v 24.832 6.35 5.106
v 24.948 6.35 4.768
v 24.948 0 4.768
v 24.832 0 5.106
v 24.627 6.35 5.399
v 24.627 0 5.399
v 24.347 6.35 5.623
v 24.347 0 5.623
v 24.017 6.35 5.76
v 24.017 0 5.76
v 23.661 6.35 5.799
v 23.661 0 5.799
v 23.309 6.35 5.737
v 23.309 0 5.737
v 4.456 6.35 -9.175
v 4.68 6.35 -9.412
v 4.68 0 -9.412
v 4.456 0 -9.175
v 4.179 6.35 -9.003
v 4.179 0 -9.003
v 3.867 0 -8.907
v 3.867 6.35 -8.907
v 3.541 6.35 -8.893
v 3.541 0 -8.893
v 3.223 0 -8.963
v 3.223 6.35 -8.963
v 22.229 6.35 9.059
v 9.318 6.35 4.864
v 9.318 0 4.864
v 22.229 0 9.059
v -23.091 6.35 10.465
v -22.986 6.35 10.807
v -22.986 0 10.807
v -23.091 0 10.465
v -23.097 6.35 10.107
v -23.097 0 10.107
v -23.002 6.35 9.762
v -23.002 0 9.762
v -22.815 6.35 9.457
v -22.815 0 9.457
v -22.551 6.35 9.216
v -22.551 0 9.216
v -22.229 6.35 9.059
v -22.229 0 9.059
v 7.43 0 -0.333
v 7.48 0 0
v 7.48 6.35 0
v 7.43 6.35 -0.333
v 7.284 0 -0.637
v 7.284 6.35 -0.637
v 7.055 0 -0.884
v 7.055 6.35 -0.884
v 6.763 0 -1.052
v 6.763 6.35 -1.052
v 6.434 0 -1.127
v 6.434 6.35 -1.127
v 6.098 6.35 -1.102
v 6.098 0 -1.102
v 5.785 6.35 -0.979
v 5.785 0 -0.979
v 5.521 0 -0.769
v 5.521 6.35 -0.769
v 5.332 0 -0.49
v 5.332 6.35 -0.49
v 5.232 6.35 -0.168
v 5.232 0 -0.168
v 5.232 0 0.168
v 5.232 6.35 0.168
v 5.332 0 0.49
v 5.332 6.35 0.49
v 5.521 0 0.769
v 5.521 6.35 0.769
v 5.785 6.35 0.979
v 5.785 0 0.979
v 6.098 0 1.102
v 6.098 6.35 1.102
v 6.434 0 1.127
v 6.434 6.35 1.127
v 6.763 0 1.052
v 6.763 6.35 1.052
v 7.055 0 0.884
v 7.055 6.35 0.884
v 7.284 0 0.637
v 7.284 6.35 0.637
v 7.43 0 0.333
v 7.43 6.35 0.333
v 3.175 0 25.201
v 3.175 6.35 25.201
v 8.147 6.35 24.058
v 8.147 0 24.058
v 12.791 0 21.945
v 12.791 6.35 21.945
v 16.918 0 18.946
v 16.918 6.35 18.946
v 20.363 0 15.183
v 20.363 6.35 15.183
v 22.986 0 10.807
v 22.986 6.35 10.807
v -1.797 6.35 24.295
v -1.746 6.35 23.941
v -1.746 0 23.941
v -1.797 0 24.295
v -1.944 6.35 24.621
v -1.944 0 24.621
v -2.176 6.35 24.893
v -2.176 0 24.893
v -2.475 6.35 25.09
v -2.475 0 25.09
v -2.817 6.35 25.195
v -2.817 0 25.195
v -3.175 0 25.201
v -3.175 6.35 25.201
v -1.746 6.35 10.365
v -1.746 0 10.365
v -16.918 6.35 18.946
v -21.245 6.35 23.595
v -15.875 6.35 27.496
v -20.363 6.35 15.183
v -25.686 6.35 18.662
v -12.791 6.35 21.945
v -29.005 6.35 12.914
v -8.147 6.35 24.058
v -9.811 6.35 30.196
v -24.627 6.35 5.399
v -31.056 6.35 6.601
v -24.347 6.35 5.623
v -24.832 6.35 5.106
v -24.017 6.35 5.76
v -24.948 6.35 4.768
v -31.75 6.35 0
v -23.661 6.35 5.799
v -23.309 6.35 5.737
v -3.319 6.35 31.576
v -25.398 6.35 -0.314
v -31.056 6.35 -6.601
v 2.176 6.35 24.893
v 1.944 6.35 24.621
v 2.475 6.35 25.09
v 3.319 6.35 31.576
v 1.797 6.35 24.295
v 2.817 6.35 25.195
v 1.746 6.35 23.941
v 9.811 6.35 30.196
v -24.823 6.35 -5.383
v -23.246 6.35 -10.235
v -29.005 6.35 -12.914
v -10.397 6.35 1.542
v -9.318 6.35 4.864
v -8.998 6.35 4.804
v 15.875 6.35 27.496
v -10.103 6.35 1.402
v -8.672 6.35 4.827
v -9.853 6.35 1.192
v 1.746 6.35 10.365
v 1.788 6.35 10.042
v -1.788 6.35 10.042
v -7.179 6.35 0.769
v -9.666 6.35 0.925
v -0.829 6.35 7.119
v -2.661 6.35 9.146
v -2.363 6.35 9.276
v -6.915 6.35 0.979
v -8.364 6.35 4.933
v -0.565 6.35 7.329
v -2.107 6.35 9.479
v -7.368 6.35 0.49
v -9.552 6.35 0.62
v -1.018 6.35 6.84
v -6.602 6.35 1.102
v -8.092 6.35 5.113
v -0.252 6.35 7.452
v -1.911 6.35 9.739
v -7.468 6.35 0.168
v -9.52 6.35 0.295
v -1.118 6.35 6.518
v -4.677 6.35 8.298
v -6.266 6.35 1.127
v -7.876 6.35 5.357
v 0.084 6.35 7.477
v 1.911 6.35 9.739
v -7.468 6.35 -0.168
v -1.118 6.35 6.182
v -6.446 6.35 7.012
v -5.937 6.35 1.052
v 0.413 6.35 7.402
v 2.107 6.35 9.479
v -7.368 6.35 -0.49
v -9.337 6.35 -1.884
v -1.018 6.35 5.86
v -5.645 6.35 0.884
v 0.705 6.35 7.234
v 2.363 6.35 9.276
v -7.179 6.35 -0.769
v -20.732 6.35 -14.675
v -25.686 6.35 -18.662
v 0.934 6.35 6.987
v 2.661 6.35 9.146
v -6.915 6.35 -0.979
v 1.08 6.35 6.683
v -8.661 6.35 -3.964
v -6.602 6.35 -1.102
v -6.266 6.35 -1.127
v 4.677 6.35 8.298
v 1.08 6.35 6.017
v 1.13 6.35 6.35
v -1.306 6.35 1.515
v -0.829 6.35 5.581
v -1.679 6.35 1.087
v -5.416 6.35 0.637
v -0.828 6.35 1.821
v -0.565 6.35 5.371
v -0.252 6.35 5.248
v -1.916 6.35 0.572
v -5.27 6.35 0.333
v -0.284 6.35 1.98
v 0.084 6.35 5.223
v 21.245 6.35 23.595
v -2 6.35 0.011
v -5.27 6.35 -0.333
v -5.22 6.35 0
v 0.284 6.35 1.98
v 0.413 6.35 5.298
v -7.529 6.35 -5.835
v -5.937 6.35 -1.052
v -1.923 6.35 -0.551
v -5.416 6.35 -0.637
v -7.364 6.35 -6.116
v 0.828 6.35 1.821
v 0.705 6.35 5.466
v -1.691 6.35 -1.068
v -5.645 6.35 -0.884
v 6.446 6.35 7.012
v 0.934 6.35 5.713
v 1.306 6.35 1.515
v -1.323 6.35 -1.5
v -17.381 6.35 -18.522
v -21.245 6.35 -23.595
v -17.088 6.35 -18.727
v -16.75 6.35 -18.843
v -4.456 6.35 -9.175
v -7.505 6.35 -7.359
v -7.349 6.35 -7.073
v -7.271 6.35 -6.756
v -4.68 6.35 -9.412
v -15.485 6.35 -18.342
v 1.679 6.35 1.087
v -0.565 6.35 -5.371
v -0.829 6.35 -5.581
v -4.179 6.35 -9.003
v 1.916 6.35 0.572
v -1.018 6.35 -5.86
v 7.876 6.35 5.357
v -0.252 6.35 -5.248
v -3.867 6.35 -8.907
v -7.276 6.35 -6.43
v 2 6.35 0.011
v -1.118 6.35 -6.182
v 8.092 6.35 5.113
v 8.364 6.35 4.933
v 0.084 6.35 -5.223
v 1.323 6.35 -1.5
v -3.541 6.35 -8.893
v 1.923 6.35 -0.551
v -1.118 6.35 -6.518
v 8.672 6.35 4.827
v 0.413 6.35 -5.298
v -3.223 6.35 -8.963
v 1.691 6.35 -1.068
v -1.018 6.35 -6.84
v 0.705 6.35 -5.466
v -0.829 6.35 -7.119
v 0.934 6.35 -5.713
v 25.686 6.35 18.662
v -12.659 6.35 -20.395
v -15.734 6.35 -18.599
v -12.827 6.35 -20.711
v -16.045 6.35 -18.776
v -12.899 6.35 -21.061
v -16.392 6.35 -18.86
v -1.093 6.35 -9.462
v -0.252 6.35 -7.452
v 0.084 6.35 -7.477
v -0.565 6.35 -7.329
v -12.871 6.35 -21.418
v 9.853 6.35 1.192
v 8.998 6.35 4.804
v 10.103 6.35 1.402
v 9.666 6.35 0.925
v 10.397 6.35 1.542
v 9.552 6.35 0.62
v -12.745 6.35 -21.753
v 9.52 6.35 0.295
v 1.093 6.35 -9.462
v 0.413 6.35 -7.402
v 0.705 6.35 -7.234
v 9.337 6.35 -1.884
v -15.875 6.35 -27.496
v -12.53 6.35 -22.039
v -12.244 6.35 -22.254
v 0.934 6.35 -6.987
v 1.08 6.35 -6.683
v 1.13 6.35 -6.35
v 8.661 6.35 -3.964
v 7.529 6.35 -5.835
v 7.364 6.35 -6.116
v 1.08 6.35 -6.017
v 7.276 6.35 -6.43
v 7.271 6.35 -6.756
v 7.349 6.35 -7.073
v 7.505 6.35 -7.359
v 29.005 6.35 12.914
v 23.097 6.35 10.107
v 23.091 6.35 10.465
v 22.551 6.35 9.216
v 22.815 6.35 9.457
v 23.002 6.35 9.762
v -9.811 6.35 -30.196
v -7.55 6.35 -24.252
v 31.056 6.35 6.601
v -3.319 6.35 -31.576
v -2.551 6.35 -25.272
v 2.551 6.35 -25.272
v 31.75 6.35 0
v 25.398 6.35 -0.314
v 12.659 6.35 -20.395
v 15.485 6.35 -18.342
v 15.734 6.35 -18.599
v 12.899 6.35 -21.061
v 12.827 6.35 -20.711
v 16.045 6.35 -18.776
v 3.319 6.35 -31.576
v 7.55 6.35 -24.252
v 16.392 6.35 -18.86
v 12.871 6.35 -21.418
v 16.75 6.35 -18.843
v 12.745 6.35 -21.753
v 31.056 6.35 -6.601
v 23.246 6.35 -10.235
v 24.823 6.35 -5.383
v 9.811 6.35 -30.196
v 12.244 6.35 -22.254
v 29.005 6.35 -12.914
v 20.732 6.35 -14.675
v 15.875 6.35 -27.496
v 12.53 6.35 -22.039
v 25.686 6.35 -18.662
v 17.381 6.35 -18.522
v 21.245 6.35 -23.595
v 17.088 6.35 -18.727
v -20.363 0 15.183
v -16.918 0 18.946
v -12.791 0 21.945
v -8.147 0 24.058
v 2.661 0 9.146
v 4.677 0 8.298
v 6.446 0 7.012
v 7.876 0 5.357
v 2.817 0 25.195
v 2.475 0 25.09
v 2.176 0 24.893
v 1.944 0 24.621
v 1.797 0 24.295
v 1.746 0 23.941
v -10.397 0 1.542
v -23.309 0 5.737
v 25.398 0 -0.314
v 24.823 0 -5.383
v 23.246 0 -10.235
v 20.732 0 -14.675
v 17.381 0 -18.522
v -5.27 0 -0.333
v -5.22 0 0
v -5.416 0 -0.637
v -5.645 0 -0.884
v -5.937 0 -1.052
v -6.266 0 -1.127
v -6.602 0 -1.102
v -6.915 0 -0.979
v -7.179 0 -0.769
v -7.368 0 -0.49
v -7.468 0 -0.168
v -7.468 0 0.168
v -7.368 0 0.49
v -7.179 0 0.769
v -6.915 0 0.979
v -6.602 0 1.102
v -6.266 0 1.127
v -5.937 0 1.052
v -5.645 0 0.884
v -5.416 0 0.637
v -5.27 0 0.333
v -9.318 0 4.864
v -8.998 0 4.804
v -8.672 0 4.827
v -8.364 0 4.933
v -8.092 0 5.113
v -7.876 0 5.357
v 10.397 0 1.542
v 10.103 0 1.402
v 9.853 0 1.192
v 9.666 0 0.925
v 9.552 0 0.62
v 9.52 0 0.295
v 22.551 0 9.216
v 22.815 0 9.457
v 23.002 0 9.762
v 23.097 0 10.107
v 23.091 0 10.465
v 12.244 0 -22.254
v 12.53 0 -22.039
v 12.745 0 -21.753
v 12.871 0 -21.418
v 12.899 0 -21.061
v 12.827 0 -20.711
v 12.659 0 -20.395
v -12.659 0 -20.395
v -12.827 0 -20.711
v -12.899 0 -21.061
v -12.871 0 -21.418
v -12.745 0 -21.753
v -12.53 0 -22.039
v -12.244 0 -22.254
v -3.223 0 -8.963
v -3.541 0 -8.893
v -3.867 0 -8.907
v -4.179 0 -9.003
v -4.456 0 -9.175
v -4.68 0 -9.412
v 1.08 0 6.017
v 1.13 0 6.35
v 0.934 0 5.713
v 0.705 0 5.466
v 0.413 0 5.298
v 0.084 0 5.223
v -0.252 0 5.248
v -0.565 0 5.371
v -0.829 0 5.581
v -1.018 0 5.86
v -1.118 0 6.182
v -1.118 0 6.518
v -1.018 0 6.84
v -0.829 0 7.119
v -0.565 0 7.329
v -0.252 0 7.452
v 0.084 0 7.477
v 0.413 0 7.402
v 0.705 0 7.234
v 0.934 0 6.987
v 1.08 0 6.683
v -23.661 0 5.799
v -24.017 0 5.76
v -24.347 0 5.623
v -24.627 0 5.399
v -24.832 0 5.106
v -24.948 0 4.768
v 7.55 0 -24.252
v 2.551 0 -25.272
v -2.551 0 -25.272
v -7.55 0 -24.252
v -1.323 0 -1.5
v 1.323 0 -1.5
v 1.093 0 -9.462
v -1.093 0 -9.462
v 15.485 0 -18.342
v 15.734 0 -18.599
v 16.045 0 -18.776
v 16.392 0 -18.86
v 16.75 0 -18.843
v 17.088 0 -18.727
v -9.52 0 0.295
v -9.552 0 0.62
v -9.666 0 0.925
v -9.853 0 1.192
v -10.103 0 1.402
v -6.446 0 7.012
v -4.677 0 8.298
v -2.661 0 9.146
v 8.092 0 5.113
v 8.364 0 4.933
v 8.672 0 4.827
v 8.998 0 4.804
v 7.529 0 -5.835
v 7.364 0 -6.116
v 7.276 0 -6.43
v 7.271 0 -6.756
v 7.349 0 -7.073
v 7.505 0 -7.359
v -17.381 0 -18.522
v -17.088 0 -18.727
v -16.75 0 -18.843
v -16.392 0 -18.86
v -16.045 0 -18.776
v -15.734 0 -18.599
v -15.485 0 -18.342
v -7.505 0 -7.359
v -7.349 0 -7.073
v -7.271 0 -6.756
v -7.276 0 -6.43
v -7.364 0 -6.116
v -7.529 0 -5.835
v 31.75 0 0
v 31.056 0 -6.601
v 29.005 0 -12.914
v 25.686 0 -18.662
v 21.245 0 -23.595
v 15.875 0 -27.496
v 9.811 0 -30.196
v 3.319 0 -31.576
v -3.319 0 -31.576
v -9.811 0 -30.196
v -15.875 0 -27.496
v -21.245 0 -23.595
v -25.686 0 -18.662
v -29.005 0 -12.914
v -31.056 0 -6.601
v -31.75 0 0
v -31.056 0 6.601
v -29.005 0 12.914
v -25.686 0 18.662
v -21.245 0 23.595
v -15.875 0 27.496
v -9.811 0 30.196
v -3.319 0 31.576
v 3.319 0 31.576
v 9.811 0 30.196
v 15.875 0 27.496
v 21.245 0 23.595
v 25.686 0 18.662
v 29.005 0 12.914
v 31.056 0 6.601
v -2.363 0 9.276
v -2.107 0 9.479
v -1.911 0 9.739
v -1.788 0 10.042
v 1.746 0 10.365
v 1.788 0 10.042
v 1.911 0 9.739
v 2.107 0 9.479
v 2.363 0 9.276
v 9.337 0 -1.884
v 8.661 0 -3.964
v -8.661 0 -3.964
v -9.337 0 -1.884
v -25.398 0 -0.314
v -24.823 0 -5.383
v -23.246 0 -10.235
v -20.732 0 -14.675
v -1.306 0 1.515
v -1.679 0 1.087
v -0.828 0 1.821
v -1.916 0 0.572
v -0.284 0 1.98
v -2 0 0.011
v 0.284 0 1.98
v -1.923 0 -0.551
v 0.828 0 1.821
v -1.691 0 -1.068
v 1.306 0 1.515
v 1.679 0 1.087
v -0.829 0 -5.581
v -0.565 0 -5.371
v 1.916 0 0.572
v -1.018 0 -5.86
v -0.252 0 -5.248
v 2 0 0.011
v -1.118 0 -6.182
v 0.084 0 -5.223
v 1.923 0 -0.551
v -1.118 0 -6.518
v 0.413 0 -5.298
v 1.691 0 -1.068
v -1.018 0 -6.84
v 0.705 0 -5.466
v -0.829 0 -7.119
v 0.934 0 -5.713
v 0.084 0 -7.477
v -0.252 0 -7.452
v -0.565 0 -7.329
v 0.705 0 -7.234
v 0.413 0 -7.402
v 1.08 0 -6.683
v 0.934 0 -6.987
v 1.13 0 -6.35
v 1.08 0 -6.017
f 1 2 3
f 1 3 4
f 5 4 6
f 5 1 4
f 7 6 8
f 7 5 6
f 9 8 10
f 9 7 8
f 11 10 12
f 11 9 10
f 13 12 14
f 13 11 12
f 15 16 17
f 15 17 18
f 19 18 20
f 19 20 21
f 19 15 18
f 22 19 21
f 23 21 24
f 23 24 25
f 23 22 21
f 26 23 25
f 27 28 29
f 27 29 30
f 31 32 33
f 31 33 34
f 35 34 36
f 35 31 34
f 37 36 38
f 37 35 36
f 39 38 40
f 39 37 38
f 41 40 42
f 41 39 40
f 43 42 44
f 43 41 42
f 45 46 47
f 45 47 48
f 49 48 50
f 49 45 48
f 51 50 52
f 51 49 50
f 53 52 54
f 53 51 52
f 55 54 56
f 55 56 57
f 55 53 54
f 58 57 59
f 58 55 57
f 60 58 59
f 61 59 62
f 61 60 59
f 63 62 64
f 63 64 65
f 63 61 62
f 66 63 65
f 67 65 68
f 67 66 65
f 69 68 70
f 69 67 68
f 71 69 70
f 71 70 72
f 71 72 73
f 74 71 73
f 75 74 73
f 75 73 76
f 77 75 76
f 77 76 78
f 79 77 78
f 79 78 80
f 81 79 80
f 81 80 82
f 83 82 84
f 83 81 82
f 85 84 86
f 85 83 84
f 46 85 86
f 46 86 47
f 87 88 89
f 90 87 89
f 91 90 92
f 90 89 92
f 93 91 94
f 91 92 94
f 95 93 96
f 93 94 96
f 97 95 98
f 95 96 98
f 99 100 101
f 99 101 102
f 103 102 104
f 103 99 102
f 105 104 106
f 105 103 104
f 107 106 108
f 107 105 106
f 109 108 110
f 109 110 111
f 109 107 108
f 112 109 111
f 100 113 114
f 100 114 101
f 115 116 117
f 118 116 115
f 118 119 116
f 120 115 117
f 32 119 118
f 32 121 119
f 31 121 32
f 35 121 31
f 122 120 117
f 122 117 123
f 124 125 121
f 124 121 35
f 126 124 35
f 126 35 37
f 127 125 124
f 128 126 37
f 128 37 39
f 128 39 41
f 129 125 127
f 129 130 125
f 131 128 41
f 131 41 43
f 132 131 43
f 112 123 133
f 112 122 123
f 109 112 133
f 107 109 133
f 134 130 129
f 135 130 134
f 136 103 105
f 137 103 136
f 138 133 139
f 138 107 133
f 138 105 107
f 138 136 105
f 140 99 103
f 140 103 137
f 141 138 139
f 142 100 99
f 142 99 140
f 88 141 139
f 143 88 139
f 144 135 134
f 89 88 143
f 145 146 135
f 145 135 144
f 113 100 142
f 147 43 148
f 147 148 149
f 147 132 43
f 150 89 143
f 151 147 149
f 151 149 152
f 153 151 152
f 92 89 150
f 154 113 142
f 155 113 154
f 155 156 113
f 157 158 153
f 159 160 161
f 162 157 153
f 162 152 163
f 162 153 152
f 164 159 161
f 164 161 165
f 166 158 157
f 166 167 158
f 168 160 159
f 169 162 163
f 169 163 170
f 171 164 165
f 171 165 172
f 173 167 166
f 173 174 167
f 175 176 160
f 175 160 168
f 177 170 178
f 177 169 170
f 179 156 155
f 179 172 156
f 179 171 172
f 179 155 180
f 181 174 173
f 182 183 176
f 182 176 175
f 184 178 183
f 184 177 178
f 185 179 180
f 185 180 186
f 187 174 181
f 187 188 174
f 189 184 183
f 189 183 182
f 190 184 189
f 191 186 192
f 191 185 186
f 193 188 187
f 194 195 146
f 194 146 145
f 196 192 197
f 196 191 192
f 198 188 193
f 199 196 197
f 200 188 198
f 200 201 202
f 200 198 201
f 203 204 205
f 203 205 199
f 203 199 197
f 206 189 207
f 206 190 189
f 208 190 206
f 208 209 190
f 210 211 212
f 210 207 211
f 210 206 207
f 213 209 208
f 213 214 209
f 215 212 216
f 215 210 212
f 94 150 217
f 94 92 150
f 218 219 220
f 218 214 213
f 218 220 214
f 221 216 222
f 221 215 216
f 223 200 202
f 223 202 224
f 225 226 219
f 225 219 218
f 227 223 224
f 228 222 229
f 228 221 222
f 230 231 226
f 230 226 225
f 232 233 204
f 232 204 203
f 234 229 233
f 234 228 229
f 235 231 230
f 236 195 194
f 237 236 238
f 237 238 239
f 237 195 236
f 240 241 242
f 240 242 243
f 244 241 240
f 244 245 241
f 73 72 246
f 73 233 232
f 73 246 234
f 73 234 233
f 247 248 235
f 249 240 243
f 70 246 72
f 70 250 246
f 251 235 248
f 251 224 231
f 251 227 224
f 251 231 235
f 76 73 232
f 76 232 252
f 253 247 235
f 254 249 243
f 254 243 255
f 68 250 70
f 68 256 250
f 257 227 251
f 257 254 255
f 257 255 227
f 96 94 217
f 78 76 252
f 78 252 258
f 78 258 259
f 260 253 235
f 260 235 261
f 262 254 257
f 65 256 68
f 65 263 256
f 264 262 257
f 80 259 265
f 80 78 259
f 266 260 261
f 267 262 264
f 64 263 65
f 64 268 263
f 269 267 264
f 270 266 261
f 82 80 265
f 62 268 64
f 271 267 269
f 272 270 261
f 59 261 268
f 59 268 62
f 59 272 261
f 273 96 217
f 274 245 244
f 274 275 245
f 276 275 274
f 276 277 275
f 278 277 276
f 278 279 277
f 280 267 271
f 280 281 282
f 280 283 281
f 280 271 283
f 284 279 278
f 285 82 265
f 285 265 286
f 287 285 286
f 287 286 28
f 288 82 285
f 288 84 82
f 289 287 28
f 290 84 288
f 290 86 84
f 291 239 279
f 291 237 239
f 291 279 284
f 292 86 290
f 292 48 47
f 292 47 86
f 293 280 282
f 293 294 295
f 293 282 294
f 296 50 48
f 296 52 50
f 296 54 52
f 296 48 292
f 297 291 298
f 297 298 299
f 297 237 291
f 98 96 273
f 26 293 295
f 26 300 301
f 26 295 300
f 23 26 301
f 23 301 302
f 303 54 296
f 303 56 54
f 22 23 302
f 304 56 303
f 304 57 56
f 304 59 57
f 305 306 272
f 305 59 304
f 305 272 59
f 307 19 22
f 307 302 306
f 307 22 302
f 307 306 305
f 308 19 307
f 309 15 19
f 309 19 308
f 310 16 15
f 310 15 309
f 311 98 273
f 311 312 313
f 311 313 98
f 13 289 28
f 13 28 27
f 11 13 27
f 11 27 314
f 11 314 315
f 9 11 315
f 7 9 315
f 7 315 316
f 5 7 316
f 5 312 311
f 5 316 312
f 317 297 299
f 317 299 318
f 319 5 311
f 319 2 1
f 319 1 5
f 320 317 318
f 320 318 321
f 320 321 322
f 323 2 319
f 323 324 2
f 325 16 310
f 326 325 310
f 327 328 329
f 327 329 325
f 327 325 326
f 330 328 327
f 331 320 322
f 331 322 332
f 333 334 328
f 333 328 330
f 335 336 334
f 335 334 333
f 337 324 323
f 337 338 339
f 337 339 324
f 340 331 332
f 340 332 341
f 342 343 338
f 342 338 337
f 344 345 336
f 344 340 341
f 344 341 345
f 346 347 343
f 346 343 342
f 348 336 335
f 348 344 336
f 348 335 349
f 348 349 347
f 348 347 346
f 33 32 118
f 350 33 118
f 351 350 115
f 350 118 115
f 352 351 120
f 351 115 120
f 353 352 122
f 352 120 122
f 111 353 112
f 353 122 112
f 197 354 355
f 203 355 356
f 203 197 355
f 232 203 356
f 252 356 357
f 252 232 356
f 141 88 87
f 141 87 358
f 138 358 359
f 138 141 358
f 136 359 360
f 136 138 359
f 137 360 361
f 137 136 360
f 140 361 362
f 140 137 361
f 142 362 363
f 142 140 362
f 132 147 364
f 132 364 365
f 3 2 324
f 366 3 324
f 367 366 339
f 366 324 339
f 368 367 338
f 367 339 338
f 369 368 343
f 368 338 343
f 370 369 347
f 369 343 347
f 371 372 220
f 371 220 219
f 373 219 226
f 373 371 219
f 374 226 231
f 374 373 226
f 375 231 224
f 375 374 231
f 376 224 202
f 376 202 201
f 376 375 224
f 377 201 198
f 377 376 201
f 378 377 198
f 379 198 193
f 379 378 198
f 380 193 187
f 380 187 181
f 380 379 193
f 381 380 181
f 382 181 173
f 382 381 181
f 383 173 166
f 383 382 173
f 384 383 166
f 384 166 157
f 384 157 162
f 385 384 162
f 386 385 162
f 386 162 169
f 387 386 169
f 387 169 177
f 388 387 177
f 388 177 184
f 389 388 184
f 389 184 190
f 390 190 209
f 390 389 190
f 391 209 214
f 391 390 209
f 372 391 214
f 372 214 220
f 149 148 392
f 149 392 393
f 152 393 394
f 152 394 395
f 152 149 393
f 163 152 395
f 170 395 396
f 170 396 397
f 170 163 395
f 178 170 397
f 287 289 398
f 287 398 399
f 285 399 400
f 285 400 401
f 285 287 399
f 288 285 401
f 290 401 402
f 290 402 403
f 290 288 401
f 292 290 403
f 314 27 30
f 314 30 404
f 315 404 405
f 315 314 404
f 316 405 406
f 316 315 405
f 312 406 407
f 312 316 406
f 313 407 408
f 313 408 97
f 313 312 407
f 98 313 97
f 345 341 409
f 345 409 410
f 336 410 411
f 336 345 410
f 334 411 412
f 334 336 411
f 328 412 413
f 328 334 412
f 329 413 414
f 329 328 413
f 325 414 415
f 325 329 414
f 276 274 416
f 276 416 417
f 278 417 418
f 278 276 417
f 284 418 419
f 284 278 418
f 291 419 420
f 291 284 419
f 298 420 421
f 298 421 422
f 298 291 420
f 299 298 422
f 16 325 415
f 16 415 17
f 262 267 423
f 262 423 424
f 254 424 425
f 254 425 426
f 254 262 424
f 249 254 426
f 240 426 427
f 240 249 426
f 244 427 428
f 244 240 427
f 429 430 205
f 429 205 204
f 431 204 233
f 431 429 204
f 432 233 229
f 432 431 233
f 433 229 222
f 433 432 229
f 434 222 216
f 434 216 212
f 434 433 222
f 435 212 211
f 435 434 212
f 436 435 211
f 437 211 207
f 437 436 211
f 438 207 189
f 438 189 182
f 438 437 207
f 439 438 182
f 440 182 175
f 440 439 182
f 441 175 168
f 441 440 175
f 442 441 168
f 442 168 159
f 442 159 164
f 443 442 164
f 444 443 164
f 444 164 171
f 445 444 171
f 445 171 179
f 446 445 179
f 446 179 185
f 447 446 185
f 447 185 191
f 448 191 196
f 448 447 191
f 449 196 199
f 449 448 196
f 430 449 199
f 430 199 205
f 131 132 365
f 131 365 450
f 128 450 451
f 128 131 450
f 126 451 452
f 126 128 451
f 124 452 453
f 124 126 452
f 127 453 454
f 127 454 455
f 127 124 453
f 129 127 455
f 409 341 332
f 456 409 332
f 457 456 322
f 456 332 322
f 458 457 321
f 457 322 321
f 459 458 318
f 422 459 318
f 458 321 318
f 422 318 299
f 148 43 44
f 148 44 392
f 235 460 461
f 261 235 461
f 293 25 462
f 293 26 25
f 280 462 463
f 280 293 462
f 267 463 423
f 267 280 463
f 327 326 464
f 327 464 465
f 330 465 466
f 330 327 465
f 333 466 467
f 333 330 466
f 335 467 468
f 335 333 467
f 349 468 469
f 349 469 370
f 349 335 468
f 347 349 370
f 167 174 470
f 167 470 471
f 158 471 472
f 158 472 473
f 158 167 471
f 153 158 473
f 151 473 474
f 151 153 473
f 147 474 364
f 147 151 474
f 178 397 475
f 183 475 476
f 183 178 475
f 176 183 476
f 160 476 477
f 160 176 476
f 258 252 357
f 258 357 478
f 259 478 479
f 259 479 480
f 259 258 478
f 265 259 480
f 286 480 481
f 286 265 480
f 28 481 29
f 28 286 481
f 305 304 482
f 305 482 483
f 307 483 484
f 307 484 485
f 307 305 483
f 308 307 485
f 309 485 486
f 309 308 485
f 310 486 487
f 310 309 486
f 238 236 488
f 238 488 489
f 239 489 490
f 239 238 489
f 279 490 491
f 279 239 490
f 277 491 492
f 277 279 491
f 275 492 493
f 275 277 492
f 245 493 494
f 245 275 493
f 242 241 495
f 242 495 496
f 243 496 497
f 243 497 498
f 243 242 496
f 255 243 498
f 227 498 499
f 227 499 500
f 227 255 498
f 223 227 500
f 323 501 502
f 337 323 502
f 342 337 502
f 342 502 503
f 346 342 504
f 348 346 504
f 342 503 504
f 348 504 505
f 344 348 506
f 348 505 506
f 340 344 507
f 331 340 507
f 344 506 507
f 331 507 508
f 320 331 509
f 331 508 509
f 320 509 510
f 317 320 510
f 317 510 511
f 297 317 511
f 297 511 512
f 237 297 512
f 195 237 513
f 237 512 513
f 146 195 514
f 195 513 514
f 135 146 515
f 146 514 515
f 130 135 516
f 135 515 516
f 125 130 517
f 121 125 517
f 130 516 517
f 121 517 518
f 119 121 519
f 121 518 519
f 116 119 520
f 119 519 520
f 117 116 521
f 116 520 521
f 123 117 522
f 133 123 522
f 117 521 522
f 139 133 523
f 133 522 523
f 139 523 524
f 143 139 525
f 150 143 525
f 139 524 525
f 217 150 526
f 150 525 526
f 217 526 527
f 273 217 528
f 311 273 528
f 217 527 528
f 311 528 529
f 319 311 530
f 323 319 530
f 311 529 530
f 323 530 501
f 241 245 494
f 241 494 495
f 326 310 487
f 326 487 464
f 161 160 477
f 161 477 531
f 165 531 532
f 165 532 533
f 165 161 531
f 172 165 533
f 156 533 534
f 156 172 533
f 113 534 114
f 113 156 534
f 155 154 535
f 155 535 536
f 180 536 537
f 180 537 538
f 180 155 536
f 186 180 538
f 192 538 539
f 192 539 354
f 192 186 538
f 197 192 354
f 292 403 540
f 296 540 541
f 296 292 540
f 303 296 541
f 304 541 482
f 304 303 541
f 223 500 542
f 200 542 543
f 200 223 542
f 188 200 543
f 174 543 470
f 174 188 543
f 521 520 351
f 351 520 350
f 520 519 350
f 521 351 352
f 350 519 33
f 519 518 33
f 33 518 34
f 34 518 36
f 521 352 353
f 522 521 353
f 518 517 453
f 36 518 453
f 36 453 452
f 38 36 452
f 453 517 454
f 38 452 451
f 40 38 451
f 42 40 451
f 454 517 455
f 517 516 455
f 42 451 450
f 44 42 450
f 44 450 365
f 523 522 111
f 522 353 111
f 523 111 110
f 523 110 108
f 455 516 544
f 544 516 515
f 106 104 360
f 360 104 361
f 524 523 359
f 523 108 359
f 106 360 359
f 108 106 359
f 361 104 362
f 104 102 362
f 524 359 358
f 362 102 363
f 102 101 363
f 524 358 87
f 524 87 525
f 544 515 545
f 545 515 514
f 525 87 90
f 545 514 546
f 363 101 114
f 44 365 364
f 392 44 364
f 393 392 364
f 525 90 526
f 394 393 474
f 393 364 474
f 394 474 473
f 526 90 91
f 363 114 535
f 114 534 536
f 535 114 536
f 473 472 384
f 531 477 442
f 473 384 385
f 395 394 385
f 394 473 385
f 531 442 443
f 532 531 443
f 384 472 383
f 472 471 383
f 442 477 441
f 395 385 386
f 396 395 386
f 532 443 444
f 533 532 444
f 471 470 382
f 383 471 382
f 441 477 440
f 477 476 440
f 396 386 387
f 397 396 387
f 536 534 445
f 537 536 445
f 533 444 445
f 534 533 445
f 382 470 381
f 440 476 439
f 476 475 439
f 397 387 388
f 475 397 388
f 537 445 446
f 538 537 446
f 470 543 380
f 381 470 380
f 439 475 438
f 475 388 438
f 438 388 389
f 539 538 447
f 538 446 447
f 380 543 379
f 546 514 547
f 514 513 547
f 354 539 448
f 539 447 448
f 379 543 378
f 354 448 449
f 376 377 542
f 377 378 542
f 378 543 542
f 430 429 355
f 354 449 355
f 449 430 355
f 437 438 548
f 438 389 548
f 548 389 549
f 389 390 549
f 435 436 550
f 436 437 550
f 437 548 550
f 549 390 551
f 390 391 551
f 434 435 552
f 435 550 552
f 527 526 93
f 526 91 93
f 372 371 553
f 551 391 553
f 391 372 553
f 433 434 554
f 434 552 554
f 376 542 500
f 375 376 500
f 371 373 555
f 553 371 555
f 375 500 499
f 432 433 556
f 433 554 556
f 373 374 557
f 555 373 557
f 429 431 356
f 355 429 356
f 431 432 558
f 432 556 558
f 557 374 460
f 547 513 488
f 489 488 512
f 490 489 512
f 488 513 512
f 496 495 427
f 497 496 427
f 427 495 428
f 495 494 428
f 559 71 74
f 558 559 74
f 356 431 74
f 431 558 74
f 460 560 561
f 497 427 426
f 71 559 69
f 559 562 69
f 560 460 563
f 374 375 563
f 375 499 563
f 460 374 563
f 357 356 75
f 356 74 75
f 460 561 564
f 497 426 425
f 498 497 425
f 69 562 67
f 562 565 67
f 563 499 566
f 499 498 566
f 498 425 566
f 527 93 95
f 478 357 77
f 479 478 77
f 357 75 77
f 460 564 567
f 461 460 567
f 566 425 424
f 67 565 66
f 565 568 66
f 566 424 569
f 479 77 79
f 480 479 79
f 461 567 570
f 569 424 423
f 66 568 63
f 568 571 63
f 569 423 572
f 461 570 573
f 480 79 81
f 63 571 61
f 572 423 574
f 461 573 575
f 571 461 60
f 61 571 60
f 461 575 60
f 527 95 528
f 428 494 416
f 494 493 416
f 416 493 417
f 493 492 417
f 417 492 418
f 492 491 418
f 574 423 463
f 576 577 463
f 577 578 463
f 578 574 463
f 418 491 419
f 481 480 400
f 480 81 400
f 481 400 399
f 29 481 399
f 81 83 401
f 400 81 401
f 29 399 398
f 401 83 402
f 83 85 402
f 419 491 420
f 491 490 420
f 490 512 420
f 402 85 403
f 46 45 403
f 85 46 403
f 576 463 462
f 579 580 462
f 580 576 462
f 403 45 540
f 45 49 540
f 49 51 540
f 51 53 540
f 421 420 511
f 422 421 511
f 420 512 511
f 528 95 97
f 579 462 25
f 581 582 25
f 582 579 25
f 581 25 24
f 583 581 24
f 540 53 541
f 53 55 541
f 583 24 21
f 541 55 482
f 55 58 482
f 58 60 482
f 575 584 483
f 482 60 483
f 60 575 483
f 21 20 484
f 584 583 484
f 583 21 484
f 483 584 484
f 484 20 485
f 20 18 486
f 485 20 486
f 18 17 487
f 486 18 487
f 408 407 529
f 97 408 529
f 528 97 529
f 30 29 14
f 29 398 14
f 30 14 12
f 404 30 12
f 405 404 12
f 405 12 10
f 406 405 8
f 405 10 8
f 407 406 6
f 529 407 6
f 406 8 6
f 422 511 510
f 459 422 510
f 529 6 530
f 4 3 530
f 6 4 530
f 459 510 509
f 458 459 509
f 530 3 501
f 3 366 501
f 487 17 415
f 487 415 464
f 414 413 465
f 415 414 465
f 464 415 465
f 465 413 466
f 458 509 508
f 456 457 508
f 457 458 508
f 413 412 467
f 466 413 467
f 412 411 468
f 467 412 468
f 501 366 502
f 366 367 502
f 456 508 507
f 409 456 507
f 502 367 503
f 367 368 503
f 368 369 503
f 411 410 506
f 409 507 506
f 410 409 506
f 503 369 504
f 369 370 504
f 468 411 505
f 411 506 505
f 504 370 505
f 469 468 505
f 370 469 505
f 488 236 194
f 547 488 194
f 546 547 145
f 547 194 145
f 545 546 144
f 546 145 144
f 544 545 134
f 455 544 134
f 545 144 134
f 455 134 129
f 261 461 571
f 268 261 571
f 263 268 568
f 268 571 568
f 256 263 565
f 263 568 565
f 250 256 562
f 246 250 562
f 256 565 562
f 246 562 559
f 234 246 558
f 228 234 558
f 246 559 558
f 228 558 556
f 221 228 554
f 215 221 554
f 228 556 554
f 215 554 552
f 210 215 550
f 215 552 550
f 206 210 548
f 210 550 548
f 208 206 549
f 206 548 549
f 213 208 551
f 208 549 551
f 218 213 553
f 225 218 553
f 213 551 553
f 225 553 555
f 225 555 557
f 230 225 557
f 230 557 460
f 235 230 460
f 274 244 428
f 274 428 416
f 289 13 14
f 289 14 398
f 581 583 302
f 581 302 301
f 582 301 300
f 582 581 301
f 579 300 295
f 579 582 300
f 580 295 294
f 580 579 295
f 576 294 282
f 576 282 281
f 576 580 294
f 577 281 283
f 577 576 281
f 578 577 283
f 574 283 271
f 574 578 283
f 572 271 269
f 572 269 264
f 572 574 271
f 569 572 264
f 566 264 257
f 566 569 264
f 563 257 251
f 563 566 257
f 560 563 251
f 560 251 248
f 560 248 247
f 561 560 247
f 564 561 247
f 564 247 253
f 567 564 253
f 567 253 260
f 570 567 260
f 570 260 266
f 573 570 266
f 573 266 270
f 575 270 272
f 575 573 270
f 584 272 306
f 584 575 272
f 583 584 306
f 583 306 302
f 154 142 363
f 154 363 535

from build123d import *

# Parameters (mm, degrees)
SKETCH1_R           = 31.75
SKETCH1_R_2         = 1.1303
BOSS_EXTRUDE1_DEPTH = 6.35
SKETCH2_R           = 25.4
SKETCH2_R_2         = 9.525
CUT_EXTRUDE1_DEPTH  = 6.35
BOSS_EXTRUDE2_DEPTH = 6.35
CIRPATTERN1_COUNT   = 5


with BuildPart() as part:
    # Sketch1 → Boss-Extrude1 (new body)
    with BuildSketch(Plane(origin=(0, 0, 0), x_dir=(1, 0, 0), z_dir=(0, 1, 0))):
        Circle(SKETCH1_R)
        with Locations((-6.35, 0)):
            Circle(SKETCH1_R_2, mode=Mode.SUBTRACT)
        with Locations((0, 6.35)):
            Circle(SKETCH1_R_2, mode=Mode.SUBTRACT)
        with Locations((6.35, 0)):
            Circle(SKETCH1_R_2, mode=Mode.SUBTRACT)
        with Locations((0, -6.35)):
            Circle(SKETCH1_R_2, mode=Mode.SUBTRACT)
        with BuildLine():
            Line((-1.322875656, 1.5), (1.322875656, 1.5))
            ThreePointArc((1.322875656, 1.5), (0, -2), (-1.322875656, 1.5))
        make_face(mode=Mode.SUBTRACT)
    extrude(amount=BOSS_EXTRUDE1_DEPTH)

    # Sketch2 → Cut-Extrude1 (cut)
    with BuildSketch(Plane(origin=(0, 6.35, 0), x_dir=(1, 0, 0), z_dir=(0, 1, 0))):
        Circle(SKETCH2_R)
        Circle(SKETCH2_R_2, mode=Mode.SUBTRACT)
    extrude(amount=-CUT_EXTRUDE1_DEPTH, mode=Mode.SUBTRACT)

    # Sketch3 → Boss-Extrude2 (add)
    with BuildSketch(Plane(origin=(0, 6.35, 0), x_dir=(1, 0, 0), z_dir=(0, 1, 0))):
        with BuildLine():
            Line((-1.74625, -10.365049973), (-1.74625, -23.940742176))
            ThreePointArc((-1.74625, -23.940742176), (-2.176223959, -24.893242176), (-3.175, -25.200781238))
            ThreePointArc((-3.175, -25.200781238), (0, -25.4), (3.175, -25.200781238))
            ThreePointArc((3.175, -25.200781238), (2.176223959, -24.893242176), (1.74625, -23.940742176))
            Line((1.74625, -23.940742176), (1.74625, -10.365049973))
            ThreePointArc((1.74625, -10.365049973), (2.000483483, -9.602738762), (2.661397059, -9.145632329))
            ThreePointArc((2.661397059, -9.145632329), (0, -9.525), (-2.661397059, -9.145632329))
            ThreePointArc((-2.661397059, -9.145632329), (-2.000483483, -9.602738762), (-1.74625, -10.365049973))
        make_face()
    boss_extrude2 = extrude(amount=-BOSS_EXTRUDE2_DEPTH)

    # CirPattern1: Boss-Extrude2 ×5 about axis
    cirpattern1_axis = Axis((0, 0, 0), (0, 1, 0))
    for i in range(1, CIRPATTERN1_COUNT):
        add(boss_extrude2.rotate(cirpattern1_axis, i * 360 / CIRPATTERN1_COUNT))


solid = part.part
